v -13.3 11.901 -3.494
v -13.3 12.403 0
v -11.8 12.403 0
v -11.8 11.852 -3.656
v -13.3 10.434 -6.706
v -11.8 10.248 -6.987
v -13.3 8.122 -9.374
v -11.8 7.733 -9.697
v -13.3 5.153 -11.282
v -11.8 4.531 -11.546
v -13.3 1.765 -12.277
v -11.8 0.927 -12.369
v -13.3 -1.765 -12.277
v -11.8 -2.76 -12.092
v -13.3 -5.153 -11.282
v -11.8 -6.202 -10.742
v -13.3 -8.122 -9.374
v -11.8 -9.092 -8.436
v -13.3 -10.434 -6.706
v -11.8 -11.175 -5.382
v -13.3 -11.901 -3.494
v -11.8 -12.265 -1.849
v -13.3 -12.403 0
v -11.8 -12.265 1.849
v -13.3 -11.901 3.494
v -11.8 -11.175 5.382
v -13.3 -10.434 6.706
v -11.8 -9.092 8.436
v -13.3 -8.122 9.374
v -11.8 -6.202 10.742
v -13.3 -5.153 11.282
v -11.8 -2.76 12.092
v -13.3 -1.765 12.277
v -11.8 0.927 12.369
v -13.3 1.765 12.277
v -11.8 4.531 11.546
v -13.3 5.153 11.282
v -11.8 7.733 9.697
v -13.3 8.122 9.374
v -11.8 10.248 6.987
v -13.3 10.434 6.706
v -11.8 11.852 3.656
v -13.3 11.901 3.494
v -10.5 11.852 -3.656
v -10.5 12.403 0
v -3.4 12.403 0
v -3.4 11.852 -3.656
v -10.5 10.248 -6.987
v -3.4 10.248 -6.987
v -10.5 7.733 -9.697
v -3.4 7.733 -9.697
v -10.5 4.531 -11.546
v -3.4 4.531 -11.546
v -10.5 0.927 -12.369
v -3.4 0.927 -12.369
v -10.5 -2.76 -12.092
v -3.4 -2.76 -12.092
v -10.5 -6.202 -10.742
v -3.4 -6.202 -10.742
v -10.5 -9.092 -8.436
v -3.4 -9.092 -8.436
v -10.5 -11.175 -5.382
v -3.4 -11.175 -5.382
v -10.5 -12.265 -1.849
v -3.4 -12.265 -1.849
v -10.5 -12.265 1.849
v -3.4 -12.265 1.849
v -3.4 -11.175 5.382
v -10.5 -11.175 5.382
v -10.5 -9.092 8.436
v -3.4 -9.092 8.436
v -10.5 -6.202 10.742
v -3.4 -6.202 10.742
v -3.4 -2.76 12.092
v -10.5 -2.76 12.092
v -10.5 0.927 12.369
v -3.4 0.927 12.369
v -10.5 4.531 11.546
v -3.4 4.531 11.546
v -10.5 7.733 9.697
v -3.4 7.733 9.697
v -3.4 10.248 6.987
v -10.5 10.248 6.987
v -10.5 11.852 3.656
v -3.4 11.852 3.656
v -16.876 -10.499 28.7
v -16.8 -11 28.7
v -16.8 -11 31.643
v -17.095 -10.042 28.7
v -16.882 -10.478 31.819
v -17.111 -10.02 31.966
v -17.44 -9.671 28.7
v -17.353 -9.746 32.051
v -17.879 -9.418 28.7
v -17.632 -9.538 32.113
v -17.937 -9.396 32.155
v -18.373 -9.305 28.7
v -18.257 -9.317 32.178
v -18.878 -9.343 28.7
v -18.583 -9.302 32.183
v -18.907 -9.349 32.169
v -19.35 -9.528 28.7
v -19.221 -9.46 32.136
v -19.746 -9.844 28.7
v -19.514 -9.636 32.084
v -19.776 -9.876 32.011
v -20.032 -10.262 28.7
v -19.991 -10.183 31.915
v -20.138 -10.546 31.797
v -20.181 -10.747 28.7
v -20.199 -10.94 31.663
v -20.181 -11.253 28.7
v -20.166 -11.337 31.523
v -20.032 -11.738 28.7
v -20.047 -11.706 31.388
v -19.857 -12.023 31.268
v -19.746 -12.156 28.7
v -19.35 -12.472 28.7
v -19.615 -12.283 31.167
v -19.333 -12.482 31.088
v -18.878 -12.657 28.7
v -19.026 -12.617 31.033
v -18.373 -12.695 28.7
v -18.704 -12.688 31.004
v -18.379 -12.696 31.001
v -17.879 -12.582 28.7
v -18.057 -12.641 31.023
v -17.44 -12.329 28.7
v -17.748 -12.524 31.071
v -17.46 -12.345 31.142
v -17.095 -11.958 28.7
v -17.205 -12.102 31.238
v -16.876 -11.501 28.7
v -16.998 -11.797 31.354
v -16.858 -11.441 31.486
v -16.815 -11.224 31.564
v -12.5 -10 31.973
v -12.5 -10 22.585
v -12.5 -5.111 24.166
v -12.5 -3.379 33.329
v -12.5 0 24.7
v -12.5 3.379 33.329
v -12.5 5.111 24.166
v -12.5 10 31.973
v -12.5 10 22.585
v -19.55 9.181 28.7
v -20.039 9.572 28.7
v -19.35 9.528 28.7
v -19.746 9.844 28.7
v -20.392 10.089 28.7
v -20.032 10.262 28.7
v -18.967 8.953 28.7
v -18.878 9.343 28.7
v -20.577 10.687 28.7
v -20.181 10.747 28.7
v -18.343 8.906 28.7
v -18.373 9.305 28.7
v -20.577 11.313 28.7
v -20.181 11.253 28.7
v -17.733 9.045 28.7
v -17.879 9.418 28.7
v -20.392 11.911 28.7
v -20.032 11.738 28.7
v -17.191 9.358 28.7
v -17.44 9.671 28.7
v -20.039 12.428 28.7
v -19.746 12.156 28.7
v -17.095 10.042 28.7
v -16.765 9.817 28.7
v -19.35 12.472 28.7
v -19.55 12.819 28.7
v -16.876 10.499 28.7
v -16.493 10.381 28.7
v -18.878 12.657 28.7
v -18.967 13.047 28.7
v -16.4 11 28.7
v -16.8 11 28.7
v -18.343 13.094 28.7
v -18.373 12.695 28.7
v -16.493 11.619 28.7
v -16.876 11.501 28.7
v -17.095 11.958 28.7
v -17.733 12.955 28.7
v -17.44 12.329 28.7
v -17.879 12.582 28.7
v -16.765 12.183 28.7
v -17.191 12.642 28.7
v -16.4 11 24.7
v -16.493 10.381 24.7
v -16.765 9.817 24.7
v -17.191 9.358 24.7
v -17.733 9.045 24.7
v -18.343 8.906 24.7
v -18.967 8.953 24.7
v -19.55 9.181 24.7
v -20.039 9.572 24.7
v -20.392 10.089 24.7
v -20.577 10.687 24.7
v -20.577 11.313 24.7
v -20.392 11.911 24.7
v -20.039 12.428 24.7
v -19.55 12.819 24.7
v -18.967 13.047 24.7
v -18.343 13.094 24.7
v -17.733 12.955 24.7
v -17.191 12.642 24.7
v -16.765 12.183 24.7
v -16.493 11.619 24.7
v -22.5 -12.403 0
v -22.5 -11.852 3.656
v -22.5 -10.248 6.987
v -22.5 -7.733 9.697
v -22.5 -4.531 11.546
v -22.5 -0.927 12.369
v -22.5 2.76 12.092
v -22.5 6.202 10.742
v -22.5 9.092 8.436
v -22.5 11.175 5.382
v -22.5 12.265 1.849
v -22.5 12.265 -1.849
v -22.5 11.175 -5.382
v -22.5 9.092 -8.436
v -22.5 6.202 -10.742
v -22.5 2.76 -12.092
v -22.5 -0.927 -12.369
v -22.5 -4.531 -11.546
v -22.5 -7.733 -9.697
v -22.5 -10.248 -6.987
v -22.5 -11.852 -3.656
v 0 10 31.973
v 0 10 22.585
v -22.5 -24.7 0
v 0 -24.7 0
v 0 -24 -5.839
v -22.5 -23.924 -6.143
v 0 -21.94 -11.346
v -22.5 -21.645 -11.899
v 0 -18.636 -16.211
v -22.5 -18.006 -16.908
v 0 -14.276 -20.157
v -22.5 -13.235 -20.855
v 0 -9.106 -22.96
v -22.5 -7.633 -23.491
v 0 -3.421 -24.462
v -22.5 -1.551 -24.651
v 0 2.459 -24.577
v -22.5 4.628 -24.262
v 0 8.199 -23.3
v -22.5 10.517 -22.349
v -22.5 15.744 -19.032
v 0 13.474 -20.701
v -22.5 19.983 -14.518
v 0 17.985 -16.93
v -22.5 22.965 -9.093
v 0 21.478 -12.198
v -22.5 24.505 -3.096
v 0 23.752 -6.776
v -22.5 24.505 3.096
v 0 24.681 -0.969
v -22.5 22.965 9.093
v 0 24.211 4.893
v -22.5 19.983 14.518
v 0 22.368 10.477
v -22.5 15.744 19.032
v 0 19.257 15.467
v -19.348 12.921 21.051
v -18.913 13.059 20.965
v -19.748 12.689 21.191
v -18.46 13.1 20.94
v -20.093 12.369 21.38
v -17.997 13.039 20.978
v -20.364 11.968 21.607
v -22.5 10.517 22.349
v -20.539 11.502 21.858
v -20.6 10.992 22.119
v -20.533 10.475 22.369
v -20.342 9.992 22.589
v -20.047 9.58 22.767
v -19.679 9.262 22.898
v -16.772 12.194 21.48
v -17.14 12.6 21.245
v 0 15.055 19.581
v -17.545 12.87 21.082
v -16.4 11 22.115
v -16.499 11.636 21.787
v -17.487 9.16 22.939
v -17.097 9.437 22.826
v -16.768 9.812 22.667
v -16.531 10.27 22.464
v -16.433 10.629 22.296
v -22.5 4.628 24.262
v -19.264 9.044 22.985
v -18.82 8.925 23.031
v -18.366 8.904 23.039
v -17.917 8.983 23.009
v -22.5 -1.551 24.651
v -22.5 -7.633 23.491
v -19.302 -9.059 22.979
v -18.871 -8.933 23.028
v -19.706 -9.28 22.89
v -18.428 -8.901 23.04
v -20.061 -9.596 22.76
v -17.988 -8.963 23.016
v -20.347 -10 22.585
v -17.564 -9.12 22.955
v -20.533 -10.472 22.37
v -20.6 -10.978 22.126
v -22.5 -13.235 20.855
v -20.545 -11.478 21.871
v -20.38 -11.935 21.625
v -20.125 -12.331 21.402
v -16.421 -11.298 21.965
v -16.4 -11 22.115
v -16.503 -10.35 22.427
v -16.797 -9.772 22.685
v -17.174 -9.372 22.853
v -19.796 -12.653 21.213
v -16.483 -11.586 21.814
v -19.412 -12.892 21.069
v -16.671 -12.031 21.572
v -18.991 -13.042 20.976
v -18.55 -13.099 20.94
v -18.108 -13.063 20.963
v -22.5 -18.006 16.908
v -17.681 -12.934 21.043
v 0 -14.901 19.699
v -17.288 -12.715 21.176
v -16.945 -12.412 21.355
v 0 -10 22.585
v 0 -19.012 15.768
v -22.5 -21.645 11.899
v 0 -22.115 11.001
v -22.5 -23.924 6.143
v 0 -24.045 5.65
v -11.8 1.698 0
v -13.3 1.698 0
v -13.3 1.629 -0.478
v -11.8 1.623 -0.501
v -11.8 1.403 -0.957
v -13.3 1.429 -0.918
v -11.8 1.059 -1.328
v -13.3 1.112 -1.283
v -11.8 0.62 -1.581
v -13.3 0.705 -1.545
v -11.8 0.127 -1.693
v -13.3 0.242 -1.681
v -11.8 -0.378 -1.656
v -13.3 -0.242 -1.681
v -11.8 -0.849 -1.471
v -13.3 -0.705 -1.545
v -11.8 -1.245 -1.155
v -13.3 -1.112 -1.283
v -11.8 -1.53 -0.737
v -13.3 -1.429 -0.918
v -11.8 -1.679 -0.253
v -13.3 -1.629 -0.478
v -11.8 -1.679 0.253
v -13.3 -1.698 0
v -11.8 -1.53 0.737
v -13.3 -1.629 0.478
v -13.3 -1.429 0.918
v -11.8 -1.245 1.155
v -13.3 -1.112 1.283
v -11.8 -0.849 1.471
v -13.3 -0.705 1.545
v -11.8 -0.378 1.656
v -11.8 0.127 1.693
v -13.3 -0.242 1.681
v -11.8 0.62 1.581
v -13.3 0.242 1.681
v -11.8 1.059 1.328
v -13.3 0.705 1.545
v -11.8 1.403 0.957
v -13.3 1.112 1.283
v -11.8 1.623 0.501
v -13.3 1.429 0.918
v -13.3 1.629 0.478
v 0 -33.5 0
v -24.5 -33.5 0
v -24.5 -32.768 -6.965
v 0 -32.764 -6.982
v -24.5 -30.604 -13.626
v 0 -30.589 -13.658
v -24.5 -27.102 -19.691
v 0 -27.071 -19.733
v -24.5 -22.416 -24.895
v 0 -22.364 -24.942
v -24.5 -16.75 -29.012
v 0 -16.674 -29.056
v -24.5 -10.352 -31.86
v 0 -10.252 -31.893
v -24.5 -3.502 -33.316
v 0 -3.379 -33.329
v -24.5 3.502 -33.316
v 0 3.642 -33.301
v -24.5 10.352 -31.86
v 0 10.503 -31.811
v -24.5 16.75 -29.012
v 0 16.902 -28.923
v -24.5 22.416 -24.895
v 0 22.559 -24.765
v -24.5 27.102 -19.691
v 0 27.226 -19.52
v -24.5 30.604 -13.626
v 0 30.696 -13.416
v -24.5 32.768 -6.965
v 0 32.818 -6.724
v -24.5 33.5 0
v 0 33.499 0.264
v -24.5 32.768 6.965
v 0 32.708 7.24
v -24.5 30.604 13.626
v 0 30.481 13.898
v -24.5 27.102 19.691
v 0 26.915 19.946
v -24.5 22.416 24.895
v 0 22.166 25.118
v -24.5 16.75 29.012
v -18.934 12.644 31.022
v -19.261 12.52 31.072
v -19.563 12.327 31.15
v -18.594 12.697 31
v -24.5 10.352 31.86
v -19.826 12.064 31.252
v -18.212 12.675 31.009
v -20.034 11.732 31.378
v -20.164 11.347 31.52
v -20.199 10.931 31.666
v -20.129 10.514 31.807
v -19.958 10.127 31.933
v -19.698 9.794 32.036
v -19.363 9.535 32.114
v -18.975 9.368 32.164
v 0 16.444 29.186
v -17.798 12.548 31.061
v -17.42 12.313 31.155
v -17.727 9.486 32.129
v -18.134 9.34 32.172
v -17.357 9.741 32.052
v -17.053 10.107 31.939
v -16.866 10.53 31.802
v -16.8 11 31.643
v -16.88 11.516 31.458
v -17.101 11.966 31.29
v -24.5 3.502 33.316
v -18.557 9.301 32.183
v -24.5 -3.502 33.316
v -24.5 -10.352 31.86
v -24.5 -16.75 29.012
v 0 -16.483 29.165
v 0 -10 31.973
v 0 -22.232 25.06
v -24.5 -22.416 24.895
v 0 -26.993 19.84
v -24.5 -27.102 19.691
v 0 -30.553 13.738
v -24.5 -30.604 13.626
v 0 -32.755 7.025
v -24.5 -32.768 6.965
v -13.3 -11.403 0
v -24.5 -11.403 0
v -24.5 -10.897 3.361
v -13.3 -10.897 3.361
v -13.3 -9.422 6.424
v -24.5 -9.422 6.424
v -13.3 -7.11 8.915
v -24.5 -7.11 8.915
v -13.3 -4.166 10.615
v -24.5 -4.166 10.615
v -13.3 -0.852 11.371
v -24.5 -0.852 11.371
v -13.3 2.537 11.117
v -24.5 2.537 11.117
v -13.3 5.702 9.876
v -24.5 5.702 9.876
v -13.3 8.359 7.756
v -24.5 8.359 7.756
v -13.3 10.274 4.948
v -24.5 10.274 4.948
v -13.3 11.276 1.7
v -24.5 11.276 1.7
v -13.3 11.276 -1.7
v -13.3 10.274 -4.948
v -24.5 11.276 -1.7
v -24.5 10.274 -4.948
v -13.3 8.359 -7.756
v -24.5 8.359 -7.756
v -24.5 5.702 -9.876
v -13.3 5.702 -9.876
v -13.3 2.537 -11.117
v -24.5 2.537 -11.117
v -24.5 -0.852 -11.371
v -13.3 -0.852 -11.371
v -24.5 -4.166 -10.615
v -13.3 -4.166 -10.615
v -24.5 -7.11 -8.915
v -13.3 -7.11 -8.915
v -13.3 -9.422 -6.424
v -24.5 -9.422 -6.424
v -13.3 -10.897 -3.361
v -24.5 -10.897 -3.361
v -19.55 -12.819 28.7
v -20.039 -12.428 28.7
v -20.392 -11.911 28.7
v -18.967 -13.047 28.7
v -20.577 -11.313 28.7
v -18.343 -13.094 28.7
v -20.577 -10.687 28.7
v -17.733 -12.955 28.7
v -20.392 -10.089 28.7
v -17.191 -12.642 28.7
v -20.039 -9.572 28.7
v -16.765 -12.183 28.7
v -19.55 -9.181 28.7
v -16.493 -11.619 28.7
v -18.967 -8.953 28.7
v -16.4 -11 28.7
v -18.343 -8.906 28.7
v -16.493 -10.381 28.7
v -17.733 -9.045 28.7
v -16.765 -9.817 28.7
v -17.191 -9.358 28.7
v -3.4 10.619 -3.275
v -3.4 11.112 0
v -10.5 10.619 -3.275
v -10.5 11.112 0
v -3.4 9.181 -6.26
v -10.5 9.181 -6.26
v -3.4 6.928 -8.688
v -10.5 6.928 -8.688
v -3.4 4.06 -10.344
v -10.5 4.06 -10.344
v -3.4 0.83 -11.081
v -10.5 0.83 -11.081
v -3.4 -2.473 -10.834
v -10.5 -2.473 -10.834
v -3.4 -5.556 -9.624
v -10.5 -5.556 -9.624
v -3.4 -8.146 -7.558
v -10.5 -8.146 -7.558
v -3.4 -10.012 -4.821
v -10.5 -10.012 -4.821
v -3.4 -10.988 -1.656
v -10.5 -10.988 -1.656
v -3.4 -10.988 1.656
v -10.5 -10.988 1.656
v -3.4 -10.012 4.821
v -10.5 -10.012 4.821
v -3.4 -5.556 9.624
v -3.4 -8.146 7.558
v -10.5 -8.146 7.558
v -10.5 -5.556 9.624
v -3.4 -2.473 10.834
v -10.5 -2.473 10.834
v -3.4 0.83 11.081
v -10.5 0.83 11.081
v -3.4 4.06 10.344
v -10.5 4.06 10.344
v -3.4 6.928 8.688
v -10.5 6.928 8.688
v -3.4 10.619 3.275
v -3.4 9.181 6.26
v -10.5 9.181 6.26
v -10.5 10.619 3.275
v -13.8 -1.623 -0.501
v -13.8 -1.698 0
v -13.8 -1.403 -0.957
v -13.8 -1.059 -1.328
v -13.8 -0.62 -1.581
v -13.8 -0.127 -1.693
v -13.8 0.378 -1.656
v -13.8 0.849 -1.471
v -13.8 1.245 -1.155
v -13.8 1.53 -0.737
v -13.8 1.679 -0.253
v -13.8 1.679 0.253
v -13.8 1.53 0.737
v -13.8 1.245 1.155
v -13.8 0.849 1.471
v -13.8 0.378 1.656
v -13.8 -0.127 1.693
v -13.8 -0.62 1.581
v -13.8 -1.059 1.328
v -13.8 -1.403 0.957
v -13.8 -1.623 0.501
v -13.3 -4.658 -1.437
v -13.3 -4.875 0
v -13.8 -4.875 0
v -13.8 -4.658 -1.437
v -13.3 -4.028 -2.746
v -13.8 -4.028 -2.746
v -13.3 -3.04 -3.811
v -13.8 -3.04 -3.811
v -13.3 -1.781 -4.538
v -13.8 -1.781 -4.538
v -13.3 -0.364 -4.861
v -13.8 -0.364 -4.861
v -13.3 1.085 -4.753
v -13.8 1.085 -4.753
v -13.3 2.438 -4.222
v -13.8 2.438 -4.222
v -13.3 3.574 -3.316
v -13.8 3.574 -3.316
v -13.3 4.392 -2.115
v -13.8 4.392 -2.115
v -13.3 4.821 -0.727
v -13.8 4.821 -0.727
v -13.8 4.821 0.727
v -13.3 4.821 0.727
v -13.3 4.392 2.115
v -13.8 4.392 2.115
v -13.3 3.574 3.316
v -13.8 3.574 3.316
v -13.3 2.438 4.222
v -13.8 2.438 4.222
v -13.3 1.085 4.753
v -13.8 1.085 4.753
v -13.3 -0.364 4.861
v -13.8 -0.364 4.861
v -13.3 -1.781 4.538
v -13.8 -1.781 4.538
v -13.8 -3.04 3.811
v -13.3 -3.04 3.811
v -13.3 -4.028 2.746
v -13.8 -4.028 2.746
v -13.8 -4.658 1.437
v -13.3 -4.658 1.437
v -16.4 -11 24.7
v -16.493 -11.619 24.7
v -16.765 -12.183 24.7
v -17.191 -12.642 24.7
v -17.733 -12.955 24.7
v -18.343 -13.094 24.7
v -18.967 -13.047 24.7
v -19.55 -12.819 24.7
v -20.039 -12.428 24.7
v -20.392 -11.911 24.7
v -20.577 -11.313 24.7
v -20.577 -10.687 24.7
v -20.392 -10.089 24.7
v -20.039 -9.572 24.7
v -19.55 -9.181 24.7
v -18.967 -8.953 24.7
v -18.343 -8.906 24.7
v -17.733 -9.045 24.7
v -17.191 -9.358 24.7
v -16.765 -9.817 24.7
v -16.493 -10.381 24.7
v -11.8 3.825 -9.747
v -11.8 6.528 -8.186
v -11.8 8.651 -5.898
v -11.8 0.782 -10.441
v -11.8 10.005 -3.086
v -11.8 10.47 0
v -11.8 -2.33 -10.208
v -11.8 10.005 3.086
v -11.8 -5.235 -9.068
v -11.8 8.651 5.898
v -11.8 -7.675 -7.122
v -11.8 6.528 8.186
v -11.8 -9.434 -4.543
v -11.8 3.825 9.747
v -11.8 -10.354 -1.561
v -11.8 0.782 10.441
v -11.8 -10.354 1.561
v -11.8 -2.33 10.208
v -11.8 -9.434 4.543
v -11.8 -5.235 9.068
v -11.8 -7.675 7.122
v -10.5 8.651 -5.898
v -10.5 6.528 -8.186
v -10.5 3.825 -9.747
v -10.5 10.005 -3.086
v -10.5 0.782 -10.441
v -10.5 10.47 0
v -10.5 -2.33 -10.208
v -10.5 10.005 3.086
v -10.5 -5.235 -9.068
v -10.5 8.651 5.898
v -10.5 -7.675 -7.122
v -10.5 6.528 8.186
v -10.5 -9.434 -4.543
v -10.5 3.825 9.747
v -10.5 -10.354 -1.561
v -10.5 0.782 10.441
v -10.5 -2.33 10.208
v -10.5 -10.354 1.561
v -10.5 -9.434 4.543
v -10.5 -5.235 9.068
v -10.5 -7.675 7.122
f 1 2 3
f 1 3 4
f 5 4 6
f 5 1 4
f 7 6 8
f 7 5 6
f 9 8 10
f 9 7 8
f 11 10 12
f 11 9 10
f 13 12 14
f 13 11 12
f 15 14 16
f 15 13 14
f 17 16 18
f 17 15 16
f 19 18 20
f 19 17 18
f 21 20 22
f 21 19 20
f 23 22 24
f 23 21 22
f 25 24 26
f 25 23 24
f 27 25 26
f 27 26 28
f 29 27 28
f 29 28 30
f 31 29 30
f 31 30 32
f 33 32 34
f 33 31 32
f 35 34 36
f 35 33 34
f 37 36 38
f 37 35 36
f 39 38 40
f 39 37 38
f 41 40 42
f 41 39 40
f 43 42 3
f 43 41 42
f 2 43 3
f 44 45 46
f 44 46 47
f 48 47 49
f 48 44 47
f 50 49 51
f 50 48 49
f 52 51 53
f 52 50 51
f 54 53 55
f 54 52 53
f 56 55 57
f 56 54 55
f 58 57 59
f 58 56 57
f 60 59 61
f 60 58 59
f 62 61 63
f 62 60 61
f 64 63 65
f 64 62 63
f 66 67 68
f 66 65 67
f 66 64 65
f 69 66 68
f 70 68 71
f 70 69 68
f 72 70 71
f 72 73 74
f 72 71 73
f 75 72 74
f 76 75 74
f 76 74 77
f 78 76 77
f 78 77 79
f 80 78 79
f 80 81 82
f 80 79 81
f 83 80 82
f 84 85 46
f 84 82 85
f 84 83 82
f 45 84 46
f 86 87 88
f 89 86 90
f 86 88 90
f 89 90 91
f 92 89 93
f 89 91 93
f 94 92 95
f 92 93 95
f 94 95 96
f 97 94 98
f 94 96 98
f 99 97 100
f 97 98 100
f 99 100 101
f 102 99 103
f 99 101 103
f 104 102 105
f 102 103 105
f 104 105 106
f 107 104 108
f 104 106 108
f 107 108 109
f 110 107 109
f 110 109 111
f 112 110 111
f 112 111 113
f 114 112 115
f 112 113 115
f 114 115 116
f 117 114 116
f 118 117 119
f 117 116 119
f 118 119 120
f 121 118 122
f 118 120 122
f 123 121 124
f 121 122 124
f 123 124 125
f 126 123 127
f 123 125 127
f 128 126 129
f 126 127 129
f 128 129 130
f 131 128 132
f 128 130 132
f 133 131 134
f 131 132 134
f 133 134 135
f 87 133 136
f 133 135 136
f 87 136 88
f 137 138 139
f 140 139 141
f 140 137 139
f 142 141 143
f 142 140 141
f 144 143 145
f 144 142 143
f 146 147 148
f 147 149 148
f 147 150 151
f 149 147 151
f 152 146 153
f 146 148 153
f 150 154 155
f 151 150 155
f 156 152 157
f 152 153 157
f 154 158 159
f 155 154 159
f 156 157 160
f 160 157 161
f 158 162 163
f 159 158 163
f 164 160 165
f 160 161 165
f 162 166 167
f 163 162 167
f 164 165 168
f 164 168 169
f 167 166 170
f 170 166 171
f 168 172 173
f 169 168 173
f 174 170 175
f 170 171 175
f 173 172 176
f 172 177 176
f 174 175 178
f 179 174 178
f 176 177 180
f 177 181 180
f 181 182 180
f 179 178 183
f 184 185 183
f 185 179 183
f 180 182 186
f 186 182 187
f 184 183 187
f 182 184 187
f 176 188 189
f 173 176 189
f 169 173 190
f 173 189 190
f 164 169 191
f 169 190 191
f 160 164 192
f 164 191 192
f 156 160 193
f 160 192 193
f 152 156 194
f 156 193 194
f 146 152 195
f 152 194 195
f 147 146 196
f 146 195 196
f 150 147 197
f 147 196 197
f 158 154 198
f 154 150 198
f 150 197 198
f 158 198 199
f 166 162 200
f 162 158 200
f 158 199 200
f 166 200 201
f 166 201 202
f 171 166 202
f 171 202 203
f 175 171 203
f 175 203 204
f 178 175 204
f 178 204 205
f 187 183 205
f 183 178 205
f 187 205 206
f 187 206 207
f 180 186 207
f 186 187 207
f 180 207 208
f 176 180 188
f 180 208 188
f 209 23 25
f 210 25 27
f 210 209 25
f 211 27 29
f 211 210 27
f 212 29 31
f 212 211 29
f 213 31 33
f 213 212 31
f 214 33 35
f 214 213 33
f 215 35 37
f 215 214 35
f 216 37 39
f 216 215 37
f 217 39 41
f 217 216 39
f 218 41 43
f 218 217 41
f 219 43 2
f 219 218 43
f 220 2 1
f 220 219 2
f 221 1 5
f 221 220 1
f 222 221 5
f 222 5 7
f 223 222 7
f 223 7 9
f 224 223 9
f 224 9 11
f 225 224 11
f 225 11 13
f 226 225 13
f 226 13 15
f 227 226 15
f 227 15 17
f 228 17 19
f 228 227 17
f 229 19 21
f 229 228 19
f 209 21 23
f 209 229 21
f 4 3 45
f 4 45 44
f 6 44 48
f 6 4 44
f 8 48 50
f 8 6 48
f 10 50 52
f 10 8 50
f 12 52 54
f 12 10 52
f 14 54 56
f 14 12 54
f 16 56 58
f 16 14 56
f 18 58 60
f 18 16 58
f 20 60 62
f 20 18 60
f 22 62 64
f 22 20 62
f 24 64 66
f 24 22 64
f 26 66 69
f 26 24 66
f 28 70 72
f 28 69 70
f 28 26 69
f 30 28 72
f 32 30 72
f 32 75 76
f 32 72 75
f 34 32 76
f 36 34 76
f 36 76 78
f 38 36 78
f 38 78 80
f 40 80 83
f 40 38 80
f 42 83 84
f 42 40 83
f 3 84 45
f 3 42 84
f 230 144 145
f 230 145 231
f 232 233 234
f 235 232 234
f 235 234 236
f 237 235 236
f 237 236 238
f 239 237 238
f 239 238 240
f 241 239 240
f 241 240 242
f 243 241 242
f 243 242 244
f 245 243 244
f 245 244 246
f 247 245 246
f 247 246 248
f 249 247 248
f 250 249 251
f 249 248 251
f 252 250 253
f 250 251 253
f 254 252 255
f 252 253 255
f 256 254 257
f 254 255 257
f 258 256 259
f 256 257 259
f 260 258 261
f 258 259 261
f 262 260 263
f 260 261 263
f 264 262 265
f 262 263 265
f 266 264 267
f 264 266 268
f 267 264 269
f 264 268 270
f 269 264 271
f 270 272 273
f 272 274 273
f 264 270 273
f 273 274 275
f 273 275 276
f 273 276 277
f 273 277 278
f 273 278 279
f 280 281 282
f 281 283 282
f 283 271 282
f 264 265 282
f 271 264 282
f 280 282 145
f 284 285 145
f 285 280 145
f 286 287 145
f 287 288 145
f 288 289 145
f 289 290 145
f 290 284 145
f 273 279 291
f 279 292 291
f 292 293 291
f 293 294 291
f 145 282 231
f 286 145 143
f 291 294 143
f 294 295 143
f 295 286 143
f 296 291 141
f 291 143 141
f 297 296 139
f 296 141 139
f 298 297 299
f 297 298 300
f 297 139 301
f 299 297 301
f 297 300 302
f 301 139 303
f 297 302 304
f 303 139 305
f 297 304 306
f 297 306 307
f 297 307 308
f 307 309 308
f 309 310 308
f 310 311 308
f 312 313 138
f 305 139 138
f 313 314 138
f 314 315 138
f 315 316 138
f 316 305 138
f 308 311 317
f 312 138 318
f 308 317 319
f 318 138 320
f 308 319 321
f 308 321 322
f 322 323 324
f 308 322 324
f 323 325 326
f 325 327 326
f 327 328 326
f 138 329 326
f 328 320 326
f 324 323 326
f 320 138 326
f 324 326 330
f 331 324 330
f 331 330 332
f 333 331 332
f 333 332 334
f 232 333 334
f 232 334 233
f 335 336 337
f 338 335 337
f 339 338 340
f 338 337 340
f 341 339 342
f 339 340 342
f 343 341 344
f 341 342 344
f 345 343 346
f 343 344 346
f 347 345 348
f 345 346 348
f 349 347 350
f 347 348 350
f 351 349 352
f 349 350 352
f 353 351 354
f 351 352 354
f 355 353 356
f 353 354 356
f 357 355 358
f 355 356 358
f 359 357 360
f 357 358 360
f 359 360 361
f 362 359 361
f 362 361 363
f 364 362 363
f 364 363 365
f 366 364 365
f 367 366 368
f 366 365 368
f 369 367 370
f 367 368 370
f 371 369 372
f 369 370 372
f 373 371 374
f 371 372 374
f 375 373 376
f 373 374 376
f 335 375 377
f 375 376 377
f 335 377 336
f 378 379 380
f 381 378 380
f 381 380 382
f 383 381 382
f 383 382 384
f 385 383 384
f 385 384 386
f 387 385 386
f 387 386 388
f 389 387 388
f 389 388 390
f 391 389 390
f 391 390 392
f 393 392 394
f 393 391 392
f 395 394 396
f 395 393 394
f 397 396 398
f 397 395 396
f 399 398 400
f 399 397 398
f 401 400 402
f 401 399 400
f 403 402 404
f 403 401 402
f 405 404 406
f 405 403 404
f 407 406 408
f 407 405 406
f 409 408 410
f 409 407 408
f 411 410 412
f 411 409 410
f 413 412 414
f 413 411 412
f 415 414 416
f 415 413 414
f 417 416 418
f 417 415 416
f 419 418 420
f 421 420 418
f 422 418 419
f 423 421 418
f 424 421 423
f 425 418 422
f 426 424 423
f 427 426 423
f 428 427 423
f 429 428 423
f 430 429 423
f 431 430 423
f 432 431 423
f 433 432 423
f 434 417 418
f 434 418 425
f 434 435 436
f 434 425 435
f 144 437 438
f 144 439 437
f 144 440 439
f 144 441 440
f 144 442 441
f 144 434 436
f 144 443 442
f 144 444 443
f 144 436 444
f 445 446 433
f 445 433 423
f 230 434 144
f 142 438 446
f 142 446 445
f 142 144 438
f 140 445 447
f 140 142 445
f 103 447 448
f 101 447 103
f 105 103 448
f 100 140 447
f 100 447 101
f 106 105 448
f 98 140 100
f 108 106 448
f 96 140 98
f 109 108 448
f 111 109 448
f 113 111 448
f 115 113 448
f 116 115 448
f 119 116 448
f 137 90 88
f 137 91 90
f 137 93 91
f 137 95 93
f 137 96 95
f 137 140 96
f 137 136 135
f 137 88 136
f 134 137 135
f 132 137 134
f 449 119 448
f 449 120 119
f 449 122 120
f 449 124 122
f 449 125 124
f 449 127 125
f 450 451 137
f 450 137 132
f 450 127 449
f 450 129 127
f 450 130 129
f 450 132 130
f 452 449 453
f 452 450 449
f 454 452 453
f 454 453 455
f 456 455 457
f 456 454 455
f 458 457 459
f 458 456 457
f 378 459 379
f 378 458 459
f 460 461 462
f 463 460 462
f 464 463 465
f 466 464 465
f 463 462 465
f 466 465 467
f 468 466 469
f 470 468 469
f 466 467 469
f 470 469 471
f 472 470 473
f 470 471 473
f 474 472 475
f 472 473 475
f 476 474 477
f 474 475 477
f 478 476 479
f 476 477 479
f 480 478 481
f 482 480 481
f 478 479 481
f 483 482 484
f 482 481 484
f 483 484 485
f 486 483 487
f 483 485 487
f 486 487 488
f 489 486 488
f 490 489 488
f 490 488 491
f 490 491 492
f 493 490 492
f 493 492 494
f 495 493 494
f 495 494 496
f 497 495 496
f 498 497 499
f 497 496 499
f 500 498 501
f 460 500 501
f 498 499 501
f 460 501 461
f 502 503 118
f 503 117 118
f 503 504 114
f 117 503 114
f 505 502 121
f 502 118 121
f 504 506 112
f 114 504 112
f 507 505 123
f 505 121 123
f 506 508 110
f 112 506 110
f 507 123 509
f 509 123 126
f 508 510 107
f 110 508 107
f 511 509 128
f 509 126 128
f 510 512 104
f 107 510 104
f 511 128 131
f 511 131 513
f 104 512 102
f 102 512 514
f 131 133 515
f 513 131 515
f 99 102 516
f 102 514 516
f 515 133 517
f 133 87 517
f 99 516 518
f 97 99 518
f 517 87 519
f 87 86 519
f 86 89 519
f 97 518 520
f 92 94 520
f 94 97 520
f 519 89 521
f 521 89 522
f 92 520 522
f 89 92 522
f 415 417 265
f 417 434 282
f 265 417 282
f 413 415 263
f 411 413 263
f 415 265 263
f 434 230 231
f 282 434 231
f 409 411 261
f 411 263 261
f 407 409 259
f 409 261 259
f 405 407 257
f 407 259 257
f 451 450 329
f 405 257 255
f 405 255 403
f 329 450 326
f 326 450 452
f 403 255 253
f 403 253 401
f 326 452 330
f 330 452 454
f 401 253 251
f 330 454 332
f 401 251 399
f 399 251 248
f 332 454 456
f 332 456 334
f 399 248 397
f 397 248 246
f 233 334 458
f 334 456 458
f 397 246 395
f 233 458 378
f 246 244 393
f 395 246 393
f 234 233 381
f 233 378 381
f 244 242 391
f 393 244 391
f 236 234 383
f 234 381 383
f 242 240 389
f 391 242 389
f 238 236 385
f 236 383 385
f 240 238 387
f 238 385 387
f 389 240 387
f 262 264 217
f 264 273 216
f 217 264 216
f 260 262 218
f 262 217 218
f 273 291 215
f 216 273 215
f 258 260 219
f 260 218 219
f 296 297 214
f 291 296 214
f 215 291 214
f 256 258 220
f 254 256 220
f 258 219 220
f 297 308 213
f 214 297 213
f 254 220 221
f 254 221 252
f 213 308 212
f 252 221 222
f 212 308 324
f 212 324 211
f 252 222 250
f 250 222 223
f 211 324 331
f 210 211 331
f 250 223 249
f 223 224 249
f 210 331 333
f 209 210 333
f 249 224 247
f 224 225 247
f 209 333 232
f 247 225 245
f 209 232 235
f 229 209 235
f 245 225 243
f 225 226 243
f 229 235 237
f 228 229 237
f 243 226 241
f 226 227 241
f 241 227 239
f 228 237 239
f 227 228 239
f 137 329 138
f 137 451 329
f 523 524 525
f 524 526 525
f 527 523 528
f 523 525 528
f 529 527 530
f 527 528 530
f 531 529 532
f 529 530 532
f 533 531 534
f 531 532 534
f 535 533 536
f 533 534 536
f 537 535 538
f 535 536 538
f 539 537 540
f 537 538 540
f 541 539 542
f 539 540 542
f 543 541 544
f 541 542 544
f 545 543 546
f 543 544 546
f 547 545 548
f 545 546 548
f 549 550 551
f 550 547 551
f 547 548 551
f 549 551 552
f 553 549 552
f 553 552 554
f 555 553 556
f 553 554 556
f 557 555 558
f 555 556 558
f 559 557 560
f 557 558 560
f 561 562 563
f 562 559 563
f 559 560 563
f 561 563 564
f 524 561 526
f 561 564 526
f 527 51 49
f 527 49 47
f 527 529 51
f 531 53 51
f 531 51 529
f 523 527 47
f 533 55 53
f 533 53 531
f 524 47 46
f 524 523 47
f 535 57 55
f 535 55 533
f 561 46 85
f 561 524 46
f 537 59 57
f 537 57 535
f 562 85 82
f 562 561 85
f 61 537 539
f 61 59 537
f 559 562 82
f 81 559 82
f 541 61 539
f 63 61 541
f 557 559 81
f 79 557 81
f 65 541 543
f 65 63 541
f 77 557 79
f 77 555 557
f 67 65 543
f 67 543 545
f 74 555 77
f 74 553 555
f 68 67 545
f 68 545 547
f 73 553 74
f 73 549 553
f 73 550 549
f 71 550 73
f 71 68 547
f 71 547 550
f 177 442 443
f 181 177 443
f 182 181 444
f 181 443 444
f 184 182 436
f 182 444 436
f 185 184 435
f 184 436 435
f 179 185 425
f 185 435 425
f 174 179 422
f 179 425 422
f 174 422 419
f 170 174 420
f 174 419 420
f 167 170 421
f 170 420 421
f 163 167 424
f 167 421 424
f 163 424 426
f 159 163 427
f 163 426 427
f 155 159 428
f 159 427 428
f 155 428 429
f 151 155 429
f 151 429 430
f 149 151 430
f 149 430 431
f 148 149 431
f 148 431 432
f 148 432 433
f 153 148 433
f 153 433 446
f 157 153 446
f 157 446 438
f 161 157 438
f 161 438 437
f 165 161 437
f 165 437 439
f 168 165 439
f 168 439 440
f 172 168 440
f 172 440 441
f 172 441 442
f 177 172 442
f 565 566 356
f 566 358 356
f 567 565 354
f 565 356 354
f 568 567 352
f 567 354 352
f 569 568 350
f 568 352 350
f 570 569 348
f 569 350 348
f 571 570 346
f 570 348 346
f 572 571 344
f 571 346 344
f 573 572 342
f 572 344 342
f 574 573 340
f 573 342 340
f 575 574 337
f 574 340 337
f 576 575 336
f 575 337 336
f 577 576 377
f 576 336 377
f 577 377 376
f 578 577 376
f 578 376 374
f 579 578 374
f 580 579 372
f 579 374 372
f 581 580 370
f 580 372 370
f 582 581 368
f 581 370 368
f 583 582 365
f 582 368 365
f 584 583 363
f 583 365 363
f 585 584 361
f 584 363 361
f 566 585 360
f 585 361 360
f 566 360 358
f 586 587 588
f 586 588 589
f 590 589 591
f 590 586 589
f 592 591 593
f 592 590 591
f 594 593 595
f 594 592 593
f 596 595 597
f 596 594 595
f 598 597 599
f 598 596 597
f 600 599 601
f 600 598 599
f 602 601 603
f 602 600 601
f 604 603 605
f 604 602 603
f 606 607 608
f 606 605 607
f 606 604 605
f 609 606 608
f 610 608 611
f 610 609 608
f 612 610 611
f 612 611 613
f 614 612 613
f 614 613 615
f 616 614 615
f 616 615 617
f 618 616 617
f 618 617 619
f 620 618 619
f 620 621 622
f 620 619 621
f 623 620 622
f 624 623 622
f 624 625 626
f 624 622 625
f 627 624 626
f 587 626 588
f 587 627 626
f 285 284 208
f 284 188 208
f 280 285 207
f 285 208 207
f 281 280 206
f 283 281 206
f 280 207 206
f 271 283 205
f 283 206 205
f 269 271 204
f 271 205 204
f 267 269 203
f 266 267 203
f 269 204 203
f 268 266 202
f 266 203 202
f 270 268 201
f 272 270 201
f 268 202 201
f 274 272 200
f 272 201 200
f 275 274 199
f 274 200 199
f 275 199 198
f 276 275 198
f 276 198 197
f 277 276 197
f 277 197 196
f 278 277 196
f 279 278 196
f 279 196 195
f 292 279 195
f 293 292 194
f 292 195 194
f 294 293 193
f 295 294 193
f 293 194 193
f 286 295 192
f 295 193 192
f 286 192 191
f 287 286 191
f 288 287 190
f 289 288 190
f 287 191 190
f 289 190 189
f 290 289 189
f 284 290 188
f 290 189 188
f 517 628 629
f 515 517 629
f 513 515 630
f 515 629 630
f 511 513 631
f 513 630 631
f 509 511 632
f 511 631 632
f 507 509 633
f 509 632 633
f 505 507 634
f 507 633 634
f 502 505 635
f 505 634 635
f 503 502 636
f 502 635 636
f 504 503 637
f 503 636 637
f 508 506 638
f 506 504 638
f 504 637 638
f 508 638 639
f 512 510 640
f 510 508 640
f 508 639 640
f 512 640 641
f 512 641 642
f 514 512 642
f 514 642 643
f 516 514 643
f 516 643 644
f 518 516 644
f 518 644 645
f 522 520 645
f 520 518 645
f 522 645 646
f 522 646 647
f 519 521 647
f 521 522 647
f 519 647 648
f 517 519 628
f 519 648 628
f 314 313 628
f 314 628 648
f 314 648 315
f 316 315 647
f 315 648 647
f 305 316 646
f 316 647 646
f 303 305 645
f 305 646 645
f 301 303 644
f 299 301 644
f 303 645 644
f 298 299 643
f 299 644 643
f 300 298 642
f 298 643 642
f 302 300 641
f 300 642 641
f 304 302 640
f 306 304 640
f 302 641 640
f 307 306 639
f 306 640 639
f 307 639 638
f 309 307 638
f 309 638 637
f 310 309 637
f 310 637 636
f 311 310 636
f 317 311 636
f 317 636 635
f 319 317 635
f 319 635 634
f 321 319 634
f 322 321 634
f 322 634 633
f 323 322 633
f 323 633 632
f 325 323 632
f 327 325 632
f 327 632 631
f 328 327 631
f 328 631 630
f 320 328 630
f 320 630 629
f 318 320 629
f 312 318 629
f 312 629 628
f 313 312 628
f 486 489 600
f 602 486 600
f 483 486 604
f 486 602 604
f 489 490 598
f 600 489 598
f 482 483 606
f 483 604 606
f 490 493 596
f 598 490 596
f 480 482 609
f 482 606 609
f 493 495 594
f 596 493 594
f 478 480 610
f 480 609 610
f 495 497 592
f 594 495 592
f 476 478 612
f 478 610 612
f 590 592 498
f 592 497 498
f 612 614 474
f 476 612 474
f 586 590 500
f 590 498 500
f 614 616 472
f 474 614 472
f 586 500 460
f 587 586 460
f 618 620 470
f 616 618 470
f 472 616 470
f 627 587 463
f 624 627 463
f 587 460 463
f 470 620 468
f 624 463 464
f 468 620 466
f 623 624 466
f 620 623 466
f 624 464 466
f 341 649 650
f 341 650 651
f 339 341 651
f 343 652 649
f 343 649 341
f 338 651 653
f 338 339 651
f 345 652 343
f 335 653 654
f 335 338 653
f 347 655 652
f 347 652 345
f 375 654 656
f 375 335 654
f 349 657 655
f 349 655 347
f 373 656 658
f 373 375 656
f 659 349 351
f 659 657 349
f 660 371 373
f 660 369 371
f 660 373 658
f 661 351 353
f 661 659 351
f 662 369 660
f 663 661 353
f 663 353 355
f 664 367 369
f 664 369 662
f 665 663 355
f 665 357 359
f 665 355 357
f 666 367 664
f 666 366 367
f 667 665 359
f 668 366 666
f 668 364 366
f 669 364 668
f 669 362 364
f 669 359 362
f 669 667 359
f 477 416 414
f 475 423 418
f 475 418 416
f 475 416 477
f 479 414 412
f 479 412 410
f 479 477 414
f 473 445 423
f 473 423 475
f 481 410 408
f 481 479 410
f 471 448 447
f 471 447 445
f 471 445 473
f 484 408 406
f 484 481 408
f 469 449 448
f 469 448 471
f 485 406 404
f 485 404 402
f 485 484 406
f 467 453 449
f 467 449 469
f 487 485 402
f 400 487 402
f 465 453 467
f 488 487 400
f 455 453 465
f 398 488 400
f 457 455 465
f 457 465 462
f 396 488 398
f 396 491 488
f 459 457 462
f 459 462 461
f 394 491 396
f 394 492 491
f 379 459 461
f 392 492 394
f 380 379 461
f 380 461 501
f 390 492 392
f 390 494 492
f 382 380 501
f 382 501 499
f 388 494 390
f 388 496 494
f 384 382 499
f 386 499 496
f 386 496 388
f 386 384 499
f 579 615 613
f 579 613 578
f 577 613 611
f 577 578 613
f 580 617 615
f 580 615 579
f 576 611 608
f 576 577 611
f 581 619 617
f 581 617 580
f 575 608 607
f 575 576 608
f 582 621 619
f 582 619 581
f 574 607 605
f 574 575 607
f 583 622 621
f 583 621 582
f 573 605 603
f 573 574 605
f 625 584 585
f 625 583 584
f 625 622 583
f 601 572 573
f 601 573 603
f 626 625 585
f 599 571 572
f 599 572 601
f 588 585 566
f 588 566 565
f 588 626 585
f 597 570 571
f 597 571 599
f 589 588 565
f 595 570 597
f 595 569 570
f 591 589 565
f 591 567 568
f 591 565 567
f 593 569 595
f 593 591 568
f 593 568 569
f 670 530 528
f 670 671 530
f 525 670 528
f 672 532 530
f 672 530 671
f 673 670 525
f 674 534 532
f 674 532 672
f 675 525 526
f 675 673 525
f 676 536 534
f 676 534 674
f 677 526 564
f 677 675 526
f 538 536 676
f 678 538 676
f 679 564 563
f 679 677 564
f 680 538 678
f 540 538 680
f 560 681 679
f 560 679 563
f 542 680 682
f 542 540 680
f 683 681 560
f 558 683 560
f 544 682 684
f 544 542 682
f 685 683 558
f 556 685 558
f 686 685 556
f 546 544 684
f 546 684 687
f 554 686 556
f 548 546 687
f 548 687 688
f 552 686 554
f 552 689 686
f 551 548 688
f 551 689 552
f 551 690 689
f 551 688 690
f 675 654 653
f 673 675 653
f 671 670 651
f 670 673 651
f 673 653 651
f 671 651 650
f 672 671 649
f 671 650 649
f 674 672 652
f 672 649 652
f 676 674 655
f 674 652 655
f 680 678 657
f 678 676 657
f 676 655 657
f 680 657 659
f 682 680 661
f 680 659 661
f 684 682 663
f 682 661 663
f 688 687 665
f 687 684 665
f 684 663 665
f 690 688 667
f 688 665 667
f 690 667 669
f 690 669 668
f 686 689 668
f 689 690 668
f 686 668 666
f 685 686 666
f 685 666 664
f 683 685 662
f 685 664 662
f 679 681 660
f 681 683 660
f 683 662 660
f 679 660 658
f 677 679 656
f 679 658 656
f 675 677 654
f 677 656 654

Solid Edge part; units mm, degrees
sketch "Sketch1" plane through (0, 0, 0) normal (-1, 0, 0) x (0, -1, 0)
  circle A0 centre (0, 0) radius 24.7
  circle A1 centre (0, 0) radius 33.5
extrude "Protrusion1" add sketch "Sketch1" along normal blind 22.5
sketch "Sketch2" plane through (-22.5, 0, 0) normal (-1, 0, 0) x (0, -1, 0)
  circle A0 centre (0, 0) radius 33.5
extrude "Protrusion2" add sketch "Sketch2" along normal blind 2
sketch "Sketch3" plane through (-24.5, 0, 0) normal (-1, 0, 0) x (0, -1, 0)
  circle A0 centre (0, 0) radius 11.4033
extrude "Cutout1" cut sketch "Sketch3" against normal up to next
sketch "Sketch4" plane through (-24.5, 0, 0) normal (-1, 0, 0) x (0, -1, 0)
  circle A0 centre (0, 0) radius 11.4033
  circle A1 centre (0, 0) radius 12.4033
extrude "Protrusion3" add sketch "Sketch4" against normal blind 11.2
sketch "Sketch5" plane through (-13.3, 0, 0) normal (1, 0, 0) x (0, 1, 0)
  circle A0 centre (0, 0) radius 1.6981
  circle A1 centre (0, 0) radius 12.4033
extrude "Protrusion4" add sketch "Sketch5" along normal blind 1.5
sketch "Sketch6" plane through (-13.3, 0, 0) normal (-1, 0, 0) x (0, -1, 0)
  circle A0 centre (0, 0) radius 1.6981
  circle A1 centre (0, 0) radius 4.875
extrude "Protrusion5" add sketch "Sketch6" along normal blind 0.5
sketch "Sketch7" plane through (-11.8, 0, 0) normal (1, 0, 0) x (0, 1, 0)
  circle A0 centre (0, 0) radius 12.4033
  circle A1 centre (0, 0) radius 10.4705
extrude "J3_Axle_BearingShoulder" add sketch "Sketch7" along normal blind 1.3
sketch "Sketch8" plane through (-10.5, 0, 0) normal (1, 0, 0) x (0, 1, 0)
  circle A0 centre (0, 0) radius 12.4033
  circle A1 centre (0, 0) radius 11.1123
extrude "J3_axle_BeaingHousing" add sketch "Sketch8" along normal blind 7.1
sketch "Sketch9" plane through (-12.25, 0, 33.5) normal (0, 0, 1) x (1, 0, 0)
  line L0 (24.75, -10) -> (-0.25, -10)
  line L1 (-0.25, -10) -> (-0.25, 10)
  line L2 (-0.25, 10) -> (24.75, 10)
  line L3 (24.75, 10) -> (24.75, -10)
extrude "Cutout2" cut sketch "Sketch9" against normal up to next
sketch "Sketch10" plane through (-11.25, 0, 24.7) normal (0, 0, 1) x (1, 0, 0)
  circle A0 centre (-7.25, 11) radius 2.1
  circle A1 centre (-7.25, -11) radius 2.1
extrude "UpperArmScrewHeadCutout" cut sketch "Sketch10" along normal mid plane 8
sketch "Sketch11" plane through (-12.25, 0, 33.5) normal (0, 0, 1) x (1, 0, 0)
  circle A0 centre (-6.25, 11) radius 1.7
  circle A1 centre (-6.25, -11) radius 1.7
extrude "UpperArmScrewCutout" cut sketch "Sketch11" against normal blind 12.8
